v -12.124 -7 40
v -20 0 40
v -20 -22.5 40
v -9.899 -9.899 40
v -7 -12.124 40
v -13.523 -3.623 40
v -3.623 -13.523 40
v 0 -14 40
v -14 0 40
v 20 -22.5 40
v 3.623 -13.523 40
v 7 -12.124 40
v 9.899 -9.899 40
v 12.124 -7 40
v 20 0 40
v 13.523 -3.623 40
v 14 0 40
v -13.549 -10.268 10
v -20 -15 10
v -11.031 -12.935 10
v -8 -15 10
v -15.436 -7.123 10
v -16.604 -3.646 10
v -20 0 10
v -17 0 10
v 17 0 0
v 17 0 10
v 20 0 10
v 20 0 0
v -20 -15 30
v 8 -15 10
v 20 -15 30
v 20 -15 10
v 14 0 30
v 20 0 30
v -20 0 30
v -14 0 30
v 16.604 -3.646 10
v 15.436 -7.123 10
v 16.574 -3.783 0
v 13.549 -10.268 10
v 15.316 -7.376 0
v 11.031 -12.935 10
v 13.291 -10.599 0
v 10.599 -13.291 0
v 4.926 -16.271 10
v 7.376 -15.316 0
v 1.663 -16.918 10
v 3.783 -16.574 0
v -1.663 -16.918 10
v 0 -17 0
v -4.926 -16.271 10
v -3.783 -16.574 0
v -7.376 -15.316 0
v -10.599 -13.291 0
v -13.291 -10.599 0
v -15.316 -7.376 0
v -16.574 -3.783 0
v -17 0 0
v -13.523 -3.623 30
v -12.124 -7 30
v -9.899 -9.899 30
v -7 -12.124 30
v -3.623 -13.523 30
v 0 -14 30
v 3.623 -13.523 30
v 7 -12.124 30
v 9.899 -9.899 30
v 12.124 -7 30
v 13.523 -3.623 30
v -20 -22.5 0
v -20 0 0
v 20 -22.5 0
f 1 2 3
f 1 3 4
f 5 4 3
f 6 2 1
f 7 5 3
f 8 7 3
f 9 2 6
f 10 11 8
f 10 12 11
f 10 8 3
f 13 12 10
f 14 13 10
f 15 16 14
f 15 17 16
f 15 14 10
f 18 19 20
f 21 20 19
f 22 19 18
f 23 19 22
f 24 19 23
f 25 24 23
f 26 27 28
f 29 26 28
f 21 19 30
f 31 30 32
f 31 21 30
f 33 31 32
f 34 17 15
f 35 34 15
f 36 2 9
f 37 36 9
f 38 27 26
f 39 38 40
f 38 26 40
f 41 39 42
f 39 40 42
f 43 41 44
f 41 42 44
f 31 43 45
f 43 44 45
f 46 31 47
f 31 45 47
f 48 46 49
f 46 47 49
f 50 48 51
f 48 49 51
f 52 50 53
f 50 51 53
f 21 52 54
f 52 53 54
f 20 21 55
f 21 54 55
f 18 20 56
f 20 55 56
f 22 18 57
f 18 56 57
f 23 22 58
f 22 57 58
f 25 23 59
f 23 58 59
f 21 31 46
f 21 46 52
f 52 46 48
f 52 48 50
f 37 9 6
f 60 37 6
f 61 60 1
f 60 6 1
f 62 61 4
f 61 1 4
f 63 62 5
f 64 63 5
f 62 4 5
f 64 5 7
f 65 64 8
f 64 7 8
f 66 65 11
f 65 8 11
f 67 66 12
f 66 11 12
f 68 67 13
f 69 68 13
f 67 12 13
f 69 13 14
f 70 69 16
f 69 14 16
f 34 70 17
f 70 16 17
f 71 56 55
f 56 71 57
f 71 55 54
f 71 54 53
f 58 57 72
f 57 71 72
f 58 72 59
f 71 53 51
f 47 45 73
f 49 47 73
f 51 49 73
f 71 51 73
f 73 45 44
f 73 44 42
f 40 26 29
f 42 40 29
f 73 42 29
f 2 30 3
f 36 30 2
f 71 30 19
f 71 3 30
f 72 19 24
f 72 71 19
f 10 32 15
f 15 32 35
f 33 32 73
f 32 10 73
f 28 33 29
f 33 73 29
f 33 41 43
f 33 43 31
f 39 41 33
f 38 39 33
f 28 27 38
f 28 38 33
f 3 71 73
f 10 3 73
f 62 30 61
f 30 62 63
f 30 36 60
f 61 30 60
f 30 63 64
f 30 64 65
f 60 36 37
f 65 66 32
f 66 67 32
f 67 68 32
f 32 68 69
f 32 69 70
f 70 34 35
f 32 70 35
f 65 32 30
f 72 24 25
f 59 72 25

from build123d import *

# Parameters (mm, degrees)
SKETCH1_W           = 40
SKETCH1_H           = 45
BOSS_EXTRUDE1_DEPTH = 40
SKETCH2_R           = 17
CUT_EXTRUDE1_DEPTH  = 10
SKETCH3_R           = 14
CUT_EXTRUDE2_DEPTH  = 10
SKETCH4_W           = 40
SKETCH4_H           = 22.5
CUT_EXTRUDE3_DEPTH  = 41
SKETCH5_W           = 40
SKETCH5_H           = 20
CUT_EXTRUDE4_DEPTH  = 15


with BuildPart() as part:
    # Sketch1 → Boss-Extrude1 (new body)
    with BuildSketch(Plane.XY):
        Rectangle(SKETCH1_W, SKETCH1_H)
    extrude(amount=BOSS_EXTRUDE1_DEPTH)

    # Sketch2 → Cut-Extrude1 (cut)
    with BuildSketch(Plane(origin=(0, 0, 0), x_dir=(-1, 0, 0), z_dir=(0, 0, -1))):
        Circle(SKETCH2_R)
    extrude(amount=-CUT_EXTRUDE1_DEPTH, mode=Mode.SUBTRACT)

    # Sketch3 → Cut-Extrude2 (cut)
    with BuildSketch(Plane.XY.offset(40)):
        Circle(SKETCH3_R)
    extrude(amount=-CUT_EXTRUDE2_DEPTH, mode=Mode.SUBTRACT)

    # Sketch4 → Cut-Extrude3 (cut, through all)
    with BuildSketch(Plane.XY.offset(40)):
        with Locations((0, 11.25)):
            Rectangle(SKETCH4_W, SKETCH4_H)
    extrude(amount=-CUT_EXTRUDE3_DEPTH, mode=Mode.SUBTRACT)

    # Sketch5 → Cut-Extrude4 (cut)
    with BuildSketch(Plane(origin=(0, 0, 0), x_dir=(1, 0, 0), z_dir=(0, 1, 0))):
        with Locations((0, -20)):
            Rectangle(SKETCH5_W, SKETCH5_H)
    extrude(amount=-CUT_EXTRUDE4_DEPTH, mode=Mode.SUBTRACT)


solid = part.part
